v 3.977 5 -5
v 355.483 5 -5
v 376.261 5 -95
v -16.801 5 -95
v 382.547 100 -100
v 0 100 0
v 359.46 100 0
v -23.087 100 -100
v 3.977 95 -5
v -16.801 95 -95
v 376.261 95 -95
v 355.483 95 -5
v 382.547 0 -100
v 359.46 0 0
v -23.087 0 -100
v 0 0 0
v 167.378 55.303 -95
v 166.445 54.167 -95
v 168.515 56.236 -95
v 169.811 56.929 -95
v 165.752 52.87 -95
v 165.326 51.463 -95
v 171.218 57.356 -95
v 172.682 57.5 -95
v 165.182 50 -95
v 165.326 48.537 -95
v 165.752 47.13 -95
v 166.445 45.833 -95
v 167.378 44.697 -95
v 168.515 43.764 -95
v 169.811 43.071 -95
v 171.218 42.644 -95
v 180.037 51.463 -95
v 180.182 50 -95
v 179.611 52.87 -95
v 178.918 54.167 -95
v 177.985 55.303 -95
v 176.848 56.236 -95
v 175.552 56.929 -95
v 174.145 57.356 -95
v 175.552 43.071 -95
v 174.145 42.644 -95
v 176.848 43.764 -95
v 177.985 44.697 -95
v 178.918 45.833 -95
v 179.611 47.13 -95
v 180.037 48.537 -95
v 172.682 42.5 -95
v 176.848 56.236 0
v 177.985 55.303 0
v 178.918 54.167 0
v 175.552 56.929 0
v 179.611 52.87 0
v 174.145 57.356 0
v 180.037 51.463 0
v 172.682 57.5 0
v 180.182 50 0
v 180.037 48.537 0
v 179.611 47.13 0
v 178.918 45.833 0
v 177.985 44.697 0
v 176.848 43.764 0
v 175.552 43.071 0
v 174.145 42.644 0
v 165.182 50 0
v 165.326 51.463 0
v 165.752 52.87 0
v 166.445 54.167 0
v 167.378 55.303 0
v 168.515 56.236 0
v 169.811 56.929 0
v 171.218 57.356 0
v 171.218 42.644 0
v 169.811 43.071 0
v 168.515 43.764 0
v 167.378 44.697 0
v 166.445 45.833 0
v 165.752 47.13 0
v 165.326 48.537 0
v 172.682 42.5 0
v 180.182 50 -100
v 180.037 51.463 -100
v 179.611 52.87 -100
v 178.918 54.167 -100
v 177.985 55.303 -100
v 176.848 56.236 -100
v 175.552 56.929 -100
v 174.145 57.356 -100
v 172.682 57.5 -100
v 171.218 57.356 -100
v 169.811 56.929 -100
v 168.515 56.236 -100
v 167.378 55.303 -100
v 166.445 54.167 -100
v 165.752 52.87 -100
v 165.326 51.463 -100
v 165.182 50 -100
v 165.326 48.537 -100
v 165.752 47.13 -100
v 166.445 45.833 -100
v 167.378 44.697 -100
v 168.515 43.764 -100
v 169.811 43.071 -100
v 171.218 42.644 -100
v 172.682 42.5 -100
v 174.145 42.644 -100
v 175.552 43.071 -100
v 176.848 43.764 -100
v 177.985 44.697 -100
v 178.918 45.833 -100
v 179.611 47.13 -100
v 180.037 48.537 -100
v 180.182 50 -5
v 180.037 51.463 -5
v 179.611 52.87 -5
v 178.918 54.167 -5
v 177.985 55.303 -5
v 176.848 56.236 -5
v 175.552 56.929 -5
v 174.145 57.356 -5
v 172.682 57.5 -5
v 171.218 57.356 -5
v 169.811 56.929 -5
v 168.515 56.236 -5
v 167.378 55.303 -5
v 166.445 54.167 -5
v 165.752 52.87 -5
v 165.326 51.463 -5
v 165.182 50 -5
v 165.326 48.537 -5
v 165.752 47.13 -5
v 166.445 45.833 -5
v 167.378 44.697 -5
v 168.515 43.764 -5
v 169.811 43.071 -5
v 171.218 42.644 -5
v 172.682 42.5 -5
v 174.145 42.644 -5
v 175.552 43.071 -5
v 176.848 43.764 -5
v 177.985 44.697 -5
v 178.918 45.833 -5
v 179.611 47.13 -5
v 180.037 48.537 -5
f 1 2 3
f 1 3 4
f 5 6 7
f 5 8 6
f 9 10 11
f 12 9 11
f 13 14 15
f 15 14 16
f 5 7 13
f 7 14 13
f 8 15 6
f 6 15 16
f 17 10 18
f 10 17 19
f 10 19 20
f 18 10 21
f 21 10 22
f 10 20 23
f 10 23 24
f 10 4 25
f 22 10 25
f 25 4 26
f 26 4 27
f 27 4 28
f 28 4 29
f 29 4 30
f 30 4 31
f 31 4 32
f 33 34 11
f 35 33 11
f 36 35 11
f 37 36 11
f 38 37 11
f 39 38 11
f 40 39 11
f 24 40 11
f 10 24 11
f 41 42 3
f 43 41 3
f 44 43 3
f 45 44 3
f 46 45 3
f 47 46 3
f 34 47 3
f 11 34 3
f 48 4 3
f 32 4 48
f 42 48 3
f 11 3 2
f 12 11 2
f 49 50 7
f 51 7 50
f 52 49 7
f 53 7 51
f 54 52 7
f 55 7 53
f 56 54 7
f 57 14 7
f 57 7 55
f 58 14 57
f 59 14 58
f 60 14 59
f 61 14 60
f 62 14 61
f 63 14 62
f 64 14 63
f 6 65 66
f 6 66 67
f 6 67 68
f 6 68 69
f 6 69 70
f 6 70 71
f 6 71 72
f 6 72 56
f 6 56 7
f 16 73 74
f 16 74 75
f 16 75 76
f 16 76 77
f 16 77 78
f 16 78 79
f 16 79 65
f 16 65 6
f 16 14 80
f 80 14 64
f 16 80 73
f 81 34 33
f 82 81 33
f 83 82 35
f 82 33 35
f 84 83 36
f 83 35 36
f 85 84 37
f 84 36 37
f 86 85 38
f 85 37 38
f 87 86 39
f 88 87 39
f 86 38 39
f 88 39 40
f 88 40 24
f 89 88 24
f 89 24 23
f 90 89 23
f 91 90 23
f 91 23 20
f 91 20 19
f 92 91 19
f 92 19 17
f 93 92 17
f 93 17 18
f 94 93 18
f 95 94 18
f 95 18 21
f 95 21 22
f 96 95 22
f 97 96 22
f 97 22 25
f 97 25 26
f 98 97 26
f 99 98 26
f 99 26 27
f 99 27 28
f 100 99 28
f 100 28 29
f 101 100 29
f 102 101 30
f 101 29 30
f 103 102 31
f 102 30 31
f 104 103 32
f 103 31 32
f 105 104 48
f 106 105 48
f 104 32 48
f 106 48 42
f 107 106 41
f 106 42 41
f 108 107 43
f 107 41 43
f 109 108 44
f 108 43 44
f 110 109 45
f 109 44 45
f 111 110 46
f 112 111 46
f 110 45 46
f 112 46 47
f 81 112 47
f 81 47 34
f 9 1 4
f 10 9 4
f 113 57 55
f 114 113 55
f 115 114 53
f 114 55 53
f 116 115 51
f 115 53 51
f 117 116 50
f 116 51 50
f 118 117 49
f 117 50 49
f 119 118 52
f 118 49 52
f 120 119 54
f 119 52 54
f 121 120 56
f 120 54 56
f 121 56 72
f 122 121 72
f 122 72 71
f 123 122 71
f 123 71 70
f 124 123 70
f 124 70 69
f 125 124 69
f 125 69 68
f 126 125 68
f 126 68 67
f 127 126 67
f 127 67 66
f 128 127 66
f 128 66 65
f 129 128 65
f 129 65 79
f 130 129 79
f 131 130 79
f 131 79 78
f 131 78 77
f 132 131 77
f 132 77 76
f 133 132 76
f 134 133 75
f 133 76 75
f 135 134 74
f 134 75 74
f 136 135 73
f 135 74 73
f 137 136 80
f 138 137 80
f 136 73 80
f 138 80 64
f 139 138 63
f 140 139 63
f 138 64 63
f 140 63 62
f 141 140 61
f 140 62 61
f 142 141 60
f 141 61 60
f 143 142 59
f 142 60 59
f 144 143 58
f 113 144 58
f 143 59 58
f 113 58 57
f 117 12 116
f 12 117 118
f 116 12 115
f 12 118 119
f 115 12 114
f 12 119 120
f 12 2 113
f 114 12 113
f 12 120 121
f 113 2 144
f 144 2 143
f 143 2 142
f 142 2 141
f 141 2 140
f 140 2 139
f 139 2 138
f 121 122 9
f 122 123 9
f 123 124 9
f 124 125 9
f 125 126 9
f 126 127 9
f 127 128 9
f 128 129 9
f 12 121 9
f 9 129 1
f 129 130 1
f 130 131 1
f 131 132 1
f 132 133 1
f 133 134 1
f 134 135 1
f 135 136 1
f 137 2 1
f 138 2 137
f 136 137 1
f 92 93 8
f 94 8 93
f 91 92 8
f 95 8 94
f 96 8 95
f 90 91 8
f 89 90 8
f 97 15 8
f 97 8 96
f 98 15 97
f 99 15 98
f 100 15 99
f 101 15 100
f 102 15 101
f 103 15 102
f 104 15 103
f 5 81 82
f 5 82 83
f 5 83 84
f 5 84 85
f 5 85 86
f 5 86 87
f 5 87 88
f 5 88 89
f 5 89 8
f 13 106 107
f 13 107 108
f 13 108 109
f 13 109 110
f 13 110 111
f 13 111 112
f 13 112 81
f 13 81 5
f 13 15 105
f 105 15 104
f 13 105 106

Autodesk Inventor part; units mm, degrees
ref_plane "YZ Plane" through (0, 0, 0) normal (1, 0, 0) x (0, 1, 0)
ref_plane "XZ Plane" through (0, 0, 0) normal (0, 1, 0) x (-1, 0, 0)
ref_plane "XY Plane" through (0, 0, 0) normal (0, 0, 1) x (1, 0, 0)
sketch "Sketch1" plane through (0, 0, 0) normal (0, 1, 0) x (-1, 0, 0)
  line L0 (0, 0) -> (-359.4604, 0)
  line L1 (-173.205, -100) -> (23.0868, -100)
  line L2 (23.0868, -100) -> (-382.5472, -100)
  line L3 (-382.5472, -100) -> (-359.4604, 0)
  line L4 (23.0868, -100) -> (0, 0)
  dimension "d16" = 103
  dimension "d17" = 100
  dimension "d18" = 405.634
  dimension "d19" = 103
extrude "Extrusion1" add sketch "Sketch1" along normal blind 5
sketch "Sketch2" plane through (0, 5, 0) normal (0, 1, 0) x (1, 0, 0)
  line L0 (-23.0868, 100) -> (0, 0) projected
  line L1 (0, 0) -> (-23.0868, 100)
  line L2 (382.5472, 100) -> (-23.0868, 100) projected
  line L3 (-23.0868, 100) -> (382.5472, 100)
  line L4 (359.4604, 0) -> (382.5472, 100) projected
  line L5 (382.5472, 100) -> (359.4604, 0)
  line L6 (359.4604, 0) -> (0, 0)
  line L7 (3.9772, 5) -> (-16.801, 95)
  line L8 (-16.801, 95) -> (376.2613, 95)
  line L9 (376.2613, 95) -> (355.4832, 5)
  line L10 (355.4832, 5) -> (3.9772, 5)
  dimension "d6" = 5
extrude "Extrusion2" add sketch "Sketch2" along normal blind 90
sketch "Sketch3" plane through (0, 0, 0) normal (0, 0, 1) x (1, 0, 0)
  line L0 (0, 0) -> (0, 50)
  line L1 (0, 0) -> (0, 95) projected
  line L2 (0, 50) -> (345.363, 50)
  circle A0 centre (172.6815, 50) radius 7.5
  dimension "d9" = 50
  dimension "d10" = 15
extrude "Extrusion3" cut sketch "Sketch3" against normal blind 455
sketch "Sketch4" plane through (0, 95, 0) normal (0, 1, 0) x (1, 0, 0)
  line L0 (-23.0868, 100) -> (0, 0) projected
  line L1 (0, 0) -> (-23.0868, 100)
  line L2 (359.4604, 0) -> (382.5472, 100) projected
  line L3 (-23.0868, 100) -> (382.5472, 100)
  line L4 (382.5472, 100) -> (359.4604, 0)
  line L5 (359.4604, 0) -> (0, 0)
  line L6 (355.4832, 5) -> (3.9772, 5) projected
extrude "Extrusion4" add sketch "Sketch4" along normal blind 5
properties part number "v chasis" material "Steel, Mild"
